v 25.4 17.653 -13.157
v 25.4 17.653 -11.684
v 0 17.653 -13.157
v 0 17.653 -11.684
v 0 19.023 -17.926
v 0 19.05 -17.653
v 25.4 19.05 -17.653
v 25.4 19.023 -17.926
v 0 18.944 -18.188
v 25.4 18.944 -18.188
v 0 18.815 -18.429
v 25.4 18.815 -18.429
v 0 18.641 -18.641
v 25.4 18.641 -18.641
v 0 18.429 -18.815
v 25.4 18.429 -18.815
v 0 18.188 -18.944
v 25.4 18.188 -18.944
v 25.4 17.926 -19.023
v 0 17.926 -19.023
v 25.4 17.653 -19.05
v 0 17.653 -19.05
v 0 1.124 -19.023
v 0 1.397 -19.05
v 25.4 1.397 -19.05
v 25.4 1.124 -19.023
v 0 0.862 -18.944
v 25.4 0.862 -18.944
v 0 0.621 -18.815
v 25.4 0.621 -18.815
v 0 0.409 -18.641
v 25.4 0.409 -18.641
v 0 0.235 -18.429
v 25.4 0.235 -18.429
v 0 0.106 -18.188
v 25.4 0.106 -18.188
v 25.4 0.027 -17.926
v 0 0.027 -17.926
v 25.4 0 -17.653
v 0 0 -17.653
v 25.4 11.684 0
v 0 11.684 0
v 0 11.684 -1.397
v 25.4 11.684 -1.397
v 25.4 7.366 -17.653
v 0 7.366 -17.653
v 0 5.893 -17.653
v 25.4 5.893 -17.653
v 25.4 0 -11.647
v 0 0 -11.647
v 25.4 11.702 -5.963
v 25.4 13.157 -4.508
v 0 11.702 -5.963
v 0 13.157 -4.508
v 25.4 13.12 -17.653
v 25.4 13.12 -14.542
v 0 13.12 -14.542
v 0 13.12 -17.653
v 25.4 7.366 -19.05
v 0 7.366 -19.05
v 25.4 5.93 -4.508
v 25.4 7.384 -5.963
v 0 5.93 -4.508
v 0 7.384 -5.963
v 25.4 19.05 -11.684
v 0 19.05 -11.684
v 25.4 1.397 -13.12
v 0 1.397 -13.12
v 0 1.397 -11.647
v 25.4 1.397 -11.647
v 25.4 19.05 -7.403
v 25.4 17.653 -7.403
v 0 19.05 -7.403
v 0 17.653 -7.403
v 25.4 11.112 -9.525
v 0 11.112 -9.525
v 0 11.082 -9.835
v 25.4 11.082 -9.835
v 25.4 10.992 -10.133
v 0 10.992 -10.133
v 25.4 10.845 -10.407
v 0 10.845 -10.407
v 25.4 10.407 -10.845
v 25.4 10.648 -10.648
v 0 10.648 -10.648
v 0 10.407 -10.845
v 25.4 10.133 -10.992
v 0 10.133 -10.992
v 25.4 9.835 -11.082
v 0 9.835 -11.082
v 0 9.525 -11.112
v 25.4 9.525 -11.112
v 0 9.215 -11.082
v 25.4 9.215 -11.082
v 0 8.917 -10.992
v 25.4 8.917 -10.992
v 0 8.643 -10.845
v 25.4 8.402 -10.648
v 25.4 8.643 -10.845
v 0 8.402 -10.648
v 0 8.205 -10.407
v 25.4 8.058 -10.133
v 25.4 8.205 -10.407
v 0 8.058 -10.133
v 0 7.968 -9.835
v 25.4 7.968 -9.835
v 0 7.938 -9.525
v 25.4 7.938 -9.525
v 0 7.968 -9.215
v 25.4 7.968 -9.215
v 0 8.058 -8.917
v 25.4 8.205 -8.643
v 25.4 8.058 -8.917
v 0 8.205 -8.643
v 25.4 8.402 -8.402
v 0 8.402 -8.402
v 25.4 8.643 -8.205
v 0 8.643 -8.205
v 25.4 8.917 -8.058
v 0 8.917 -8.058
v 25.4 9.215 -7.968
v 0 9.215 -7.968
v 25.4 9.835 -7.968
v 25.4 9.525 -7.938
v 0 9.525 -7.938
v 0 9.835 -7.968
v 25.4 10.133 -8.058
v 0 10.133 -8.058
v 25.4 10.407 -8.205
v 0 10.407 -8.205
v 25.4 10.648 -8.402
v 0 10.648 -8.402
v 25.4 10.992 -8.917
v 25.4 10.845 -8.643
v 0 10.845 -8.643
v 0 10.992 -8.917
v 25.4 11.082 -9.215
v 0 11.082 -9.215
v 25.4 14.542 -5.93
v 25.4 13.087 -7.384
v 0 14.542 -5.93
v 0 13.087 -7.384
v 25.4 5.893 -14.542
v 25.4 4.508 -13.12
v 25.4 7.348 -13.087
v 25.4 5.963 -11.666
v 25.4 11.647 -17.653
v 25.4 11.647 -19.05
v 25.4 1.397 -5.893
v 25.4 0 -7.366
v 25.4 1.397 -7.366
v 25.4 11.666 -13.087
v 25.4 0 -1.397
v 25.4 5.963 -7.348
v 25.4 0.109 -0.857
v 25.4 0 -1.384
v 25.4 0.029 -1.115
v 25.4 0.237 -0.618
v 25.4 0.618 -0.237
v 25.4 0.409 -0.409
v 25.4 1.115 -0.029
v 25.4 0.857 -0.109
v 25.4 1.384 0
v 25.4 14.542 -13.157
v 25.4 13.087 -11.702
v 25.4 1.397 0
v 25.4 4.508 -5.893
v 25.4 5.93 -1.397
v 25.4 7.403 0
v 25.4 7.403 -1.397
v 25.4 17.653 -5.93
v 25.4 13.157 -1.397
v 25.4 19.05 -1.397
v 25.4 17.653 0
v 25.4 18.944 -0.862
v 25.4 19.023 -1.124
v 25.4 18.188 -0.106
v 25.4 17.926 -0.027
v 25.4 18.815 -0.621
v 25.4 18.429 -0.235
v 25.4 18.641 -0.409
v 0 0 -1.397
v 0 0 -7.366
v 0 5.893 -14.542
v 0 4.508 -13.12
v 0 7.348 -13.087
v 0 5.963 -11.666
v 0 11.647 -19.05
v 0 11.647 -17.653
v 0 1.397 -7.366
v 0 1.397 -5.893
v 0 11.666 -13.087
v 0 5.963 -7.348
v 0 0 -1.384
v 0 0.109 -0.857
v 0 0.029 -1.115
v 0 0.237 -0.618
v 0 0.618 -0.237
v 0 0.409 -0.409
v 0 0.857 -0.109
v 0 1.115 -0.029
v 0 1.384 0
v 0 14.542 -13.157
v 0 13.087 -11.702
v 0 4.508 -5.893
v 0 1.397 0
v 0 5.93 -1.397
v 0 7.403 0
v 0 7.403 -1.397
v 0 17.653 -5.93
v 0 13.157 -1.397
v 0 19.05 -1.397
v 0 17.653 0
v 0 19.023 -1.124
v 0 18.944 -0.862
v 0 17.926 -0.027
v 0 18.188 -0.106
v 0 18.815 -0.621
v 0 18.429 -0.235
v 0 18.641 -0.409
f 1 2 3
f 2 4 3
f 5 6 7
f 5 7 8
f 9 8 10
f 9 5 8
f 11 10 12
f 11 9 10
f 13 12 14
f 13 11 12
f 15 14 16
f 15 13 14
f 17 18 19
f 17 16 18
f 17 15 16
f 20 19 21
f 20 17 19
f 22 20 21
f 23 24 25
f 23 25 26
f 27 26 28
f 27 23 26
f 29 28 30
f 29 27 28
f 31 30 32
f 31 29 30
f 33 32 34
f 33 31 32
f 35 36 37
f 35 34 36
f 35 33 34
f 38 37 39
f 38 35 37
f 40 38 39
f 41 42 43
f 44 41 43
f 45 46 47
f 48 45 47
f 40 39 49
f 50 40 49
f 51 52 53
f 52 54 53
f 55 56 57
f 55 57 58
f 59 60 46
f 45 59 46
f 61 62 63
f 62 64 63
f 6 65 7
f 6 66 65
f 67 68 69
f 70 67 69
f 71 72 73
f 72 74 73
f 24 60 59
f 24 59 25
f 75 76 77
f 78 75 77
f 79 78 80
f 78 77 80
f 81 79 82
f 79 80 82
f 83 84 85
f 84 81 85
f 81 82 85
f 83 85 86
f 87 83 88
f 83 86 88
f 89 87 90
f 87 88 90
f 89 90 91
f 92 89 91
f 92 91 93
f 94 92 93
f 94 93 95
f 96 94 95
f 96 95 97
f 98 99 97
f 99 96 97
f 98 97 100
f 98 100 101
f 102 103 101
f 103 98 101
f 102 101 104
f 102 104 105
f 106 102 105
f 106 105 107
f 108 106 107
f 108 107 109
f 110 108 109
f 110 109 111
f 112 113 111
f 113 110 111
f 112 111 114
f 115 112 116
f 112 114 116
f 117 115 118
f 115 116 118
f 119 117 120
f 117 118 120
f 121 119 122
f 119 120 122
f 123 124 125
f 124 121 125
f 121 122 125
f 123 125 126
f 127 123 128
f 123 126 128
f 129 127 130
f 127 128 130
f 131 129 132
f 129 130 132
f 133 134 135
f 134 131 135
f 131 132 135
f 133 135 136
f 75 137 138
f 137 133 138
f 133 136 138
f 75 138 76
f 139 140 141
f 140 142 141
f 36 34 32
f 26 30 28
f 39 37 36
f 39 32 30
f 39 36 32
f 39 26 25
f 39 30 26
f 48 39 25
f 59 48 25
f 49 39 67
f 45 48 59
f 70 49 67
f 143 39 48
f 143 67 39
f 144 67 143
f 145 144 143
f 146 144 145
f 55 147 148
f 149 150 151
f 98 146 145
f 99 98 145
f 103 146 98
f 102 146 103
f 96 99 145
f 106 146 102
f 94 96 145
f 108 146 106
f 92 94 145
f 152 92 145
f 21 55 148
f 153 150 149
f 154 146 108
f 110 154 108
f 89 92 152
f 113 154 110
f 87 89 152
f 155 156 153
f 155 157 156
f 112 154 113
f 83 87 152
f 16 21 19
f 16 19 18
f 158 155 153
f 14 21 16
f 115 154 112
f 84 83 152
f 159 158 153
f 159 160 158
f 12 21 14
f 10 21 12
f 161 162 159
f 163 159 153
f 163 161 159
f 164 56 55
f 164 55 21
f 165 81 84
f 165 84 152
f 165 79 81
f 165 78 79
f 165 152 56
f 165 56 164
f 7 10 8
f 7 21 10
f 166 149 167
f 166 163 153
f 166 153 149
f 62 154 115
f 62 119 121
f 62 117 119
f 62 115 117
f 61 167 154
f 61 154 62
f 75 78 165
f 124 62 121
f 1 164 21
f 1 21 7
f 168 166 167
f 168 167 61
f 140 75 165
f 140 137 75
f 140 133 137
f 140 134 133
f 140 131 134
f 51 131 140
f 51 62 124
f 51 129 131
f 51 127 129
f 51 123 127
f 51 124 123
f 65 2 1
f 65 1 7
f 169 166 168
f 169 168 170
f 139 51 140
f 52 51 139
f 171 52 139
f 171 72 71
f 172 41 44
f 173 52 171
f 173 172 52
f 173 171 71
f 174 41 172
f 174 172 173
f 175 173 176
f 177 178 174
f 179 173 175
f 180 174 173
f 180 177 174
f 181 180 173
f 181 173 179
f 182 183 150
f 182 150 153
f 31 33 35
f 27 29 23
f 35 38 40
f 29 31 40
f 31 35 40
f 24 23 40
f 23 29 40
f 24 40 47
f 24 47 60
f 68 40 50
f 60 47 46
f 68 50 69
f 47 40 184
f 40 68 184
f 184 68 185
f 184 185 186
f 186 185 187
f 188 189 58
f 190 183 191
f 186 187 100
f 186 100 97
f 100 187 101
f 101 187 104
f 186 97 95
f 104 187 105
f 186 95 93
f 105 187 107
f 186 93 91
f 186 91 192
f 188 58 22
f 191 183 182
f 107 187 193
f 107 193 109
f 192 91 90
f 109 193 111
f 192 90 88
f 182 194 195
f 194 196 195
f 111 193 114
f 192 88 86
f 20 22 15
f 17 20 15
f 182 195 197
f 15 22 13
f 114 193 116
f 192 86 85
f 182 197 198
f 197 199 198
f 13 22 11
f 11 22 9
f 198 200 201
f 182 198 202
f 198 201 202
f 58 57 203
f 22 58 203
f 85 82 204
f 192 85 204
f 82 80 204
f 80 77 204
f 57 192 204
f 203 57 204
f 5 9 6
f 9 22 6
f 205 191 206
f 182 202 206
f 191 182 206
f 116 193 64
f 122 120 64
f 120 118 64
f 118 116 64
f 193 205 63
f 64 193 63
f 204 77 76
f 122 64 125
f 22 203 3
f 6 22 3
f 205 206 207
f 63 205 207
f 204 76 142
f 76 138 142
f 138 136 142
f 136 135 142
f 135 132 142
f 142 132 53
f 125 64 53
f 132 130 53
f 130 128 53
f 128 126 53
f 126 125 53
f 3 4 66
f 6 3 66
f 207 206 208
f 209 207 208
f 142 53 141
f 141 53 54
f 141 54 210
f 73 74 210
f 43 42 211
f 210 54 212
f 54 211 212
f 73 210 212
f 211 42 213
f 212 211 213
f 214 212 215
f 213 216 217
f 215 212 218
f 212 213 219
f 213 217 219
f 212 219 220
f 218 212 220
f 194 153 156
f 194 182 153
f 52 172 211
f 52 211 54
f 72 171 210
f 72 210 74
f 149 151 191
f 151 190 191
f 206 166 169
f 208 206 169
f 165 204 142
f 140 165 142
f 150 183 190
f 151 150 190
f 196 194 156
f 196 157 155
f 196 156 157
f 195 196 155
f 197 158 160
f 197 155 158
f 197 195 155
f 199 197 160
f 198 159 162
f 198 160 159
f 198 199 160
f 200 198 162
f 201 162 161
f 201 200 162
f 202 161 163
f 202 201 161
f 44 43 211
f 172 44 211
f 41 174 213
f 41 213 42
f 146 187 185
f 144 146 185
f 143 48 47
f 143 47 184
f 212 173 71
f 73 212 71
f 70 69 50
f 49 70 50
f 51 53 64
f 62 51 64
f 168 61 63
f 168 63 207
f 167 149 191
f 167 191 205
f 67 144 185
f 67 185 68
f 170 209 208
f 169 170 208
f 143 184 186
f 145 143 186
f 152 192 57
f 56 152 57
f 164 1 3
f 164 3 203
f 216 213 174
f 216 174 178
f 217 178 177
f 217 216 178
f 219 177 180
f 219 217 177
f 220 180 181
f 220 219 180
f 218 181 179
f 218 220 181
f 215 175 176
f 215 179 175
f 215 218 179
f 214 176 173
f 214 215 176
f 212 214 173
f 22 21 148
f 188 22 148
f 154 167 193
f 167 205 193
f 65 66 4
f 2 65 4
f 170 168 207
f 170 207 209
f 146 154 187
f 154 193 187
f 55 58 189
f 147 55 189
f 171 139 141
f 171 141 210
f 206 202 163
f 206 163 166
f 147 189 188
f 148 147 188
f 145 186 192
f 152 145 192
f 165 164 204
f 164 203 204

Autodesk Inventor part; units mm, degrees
ref_plane "YZ Plane" through (0, 0, 0) normal (1, 0, 0) x (0, 1, 0)
ref_plane "XZ Plane" through (0, 0, 0) normal (0, 1, 0) x (-1, 0, 0)
ref_plane "XY Plane" through (0, 0, 0) normal (0, 0, 1) x (1, 0, 0)
sketch "Sketch2" plane through (0, 0, 0) normal (1, 0, 0) x (0, 1, 0)
  line L0 (1.3843, 0) -> (1.397, 0)
  line L1 (17.653, 0) -> (11.684, 0)
  line L2 (11.684, 0) -> (11.684, -1.397)
  line L3 (11.684, -1.397) -> (13.1572, -1.397)
  line L4 (13.1572, -1.397) -> (13.1572, -4.5085)
  line L5 (13.1572, -4.5085) -> (11.7024, -5.9633)
  line L6 (11.7024, -5.9633) -> (7.3844, -5.9633)
  line L7 (7.3844, -5.9633) -> (5.9296, -4.5085)
  line L8 (5.9296, -4.5085) -> (5.9296, -1.397)
  line L9 (5.9296, -1.397) -> (7.4028, -1.397)
  line L10 (7.4028, -1.397) -> (7.4028, 0)
  line L11 (1.397, 0) -> (7.4028, 0)
  line L12 (11.684, 0) -> (19.05, 0)
  line L13 (5.9633, -7.3476) -> (5.9633, -11.6656)
  line L14 (4.5085, -5.8928) -> (5.9633, -7.3476)
  line L15 (5.9633, -11.6656) -> (4.5085, -13.1204)
  line L16 (1.397, -13.1204) -> (1.397, -11.6472)
  line L17 (4.5085, -13.1204) -> (1.397, -13.1204)
  line L18 (1.397, -11.6472) -> (0, -11.6472)
  line L19 (1.397, -5.8928) -> (4.5085, -5.8928)
  line L20 (0, -7.366) -> (1.397, -7.366)
  line L21 (1.397, -7.366) -> (1.397, -5.8928)
  line L22 (7.3476, -13.0867) -> (11.6656, -13.0867)
  line L23 (5.8928, -14.5415) -> (7.3476, -13.0867)
  line L24 (11.6656, -13.0867) -> (13.1204, -14.5415)
  line L25 (13.1204, -17.653) -> (11.6472, -17.653)
  line L26 (13.1204, -14.5415) -> (13.1204, -17.653)
  line L27 (11.6472, -17.653) -> (11.6472, -19.05)
  line L28 (5.8928, -17.653) -> (5.8928, -14.5415)
  line L29 (7.366, -19.05) -> (7.366, -17.653)
  line L30 (7.366, -17.653) -> (5.8928, -17.653)
  line L31 (13.0867, -11.7024) -> (13.0867, -7.3844)
  line L32 (14.5415, -13.1572) -> (13.0867, -11.7024)
  line L33 (13.0867, -7.3844) -> (14.5415, -5.9296)
  line L34 (17.653, -5.9296) -> (17.653, -7.4028)
  line L35 (14.5415, -5.9296) -> (17.653, -5.9296)
  line L36 (17.653, -7.4028) -> (19.05, -7.4028)
  line L37 (17.653, -13.1572) -> (14.5415, -13.1572)
  line L38 (19.05, -11.684) -> (17.653, -11.684)
  line L39 (17.653, -11.684) -> (17.653, -13.1572)
  line L40 (1.3843, 0) -> (1.397, 0)
  line L41 (19.05, -1.397) -> (19.05, -7.4028)
  line L42 (19.05, -11.684) -> (19.05, -17.653)
  line L43 (17.653, -19.05) -> (11.6472, -19.05)
  line L44 (7.366, -19.05) -> (1.397, -19.05)
  line L45 (0, -17.653) -> (0, -11.6472)
  line L46 (0, -7.366) -> (0, -1.397)
  line L47 (0, -7.366) -> (0, -1.397)
  circle A0 centre (9.525, -9.525) radius 1.5875
  line L48 (1.3843, 0) -> (1.397, 0)
  line L49 (0, -1.397) -> (0, -1.3843)
  arc A1 (1.397, 0) -> (0, -1.397) centre (1.397, -1.397) ccw
  arc A2 (0, -17.653) -> (1.397, -19.05) centre (1.397, -17.653) ccw
  arc A3 (17.653, -19.05) -> (19.05, -17.653) centre (17.653, -17.653) ccw
  arc A4 (19.05, -1.397) -> (17.653, 0) centre (17.653, -1.397) ccw
  point P0 (0, 0)
  dimension "d34" = 7.366
  dimension "d35" = 1.397
  dimension "d37" = 1.4732
  dimension "d38" = 3.1115
  dimension "d39" = 2.0574
  dimension "d40" = 135
  dimension "d41" = 4.318
  dimension "d42" = 2.0574
  dimension "d43" = 1.4732
  dimension "d46" = 1.397
  dimension "d49" = 360
  dimension "d56" = 19.05
  dimension "d58" = 3.175
  dimension "d61" = 1.397
  dimension "d62" = 1.397
  dimension "d63" = 1.397
  dimension "d64" = 1.397
  dimension "d67" = 360
  dimension "d71" = 3.1115
extrude "Extrusion1" add sketch "Sketch2" along normal blind 25.4
properties part number "Extrusion"
